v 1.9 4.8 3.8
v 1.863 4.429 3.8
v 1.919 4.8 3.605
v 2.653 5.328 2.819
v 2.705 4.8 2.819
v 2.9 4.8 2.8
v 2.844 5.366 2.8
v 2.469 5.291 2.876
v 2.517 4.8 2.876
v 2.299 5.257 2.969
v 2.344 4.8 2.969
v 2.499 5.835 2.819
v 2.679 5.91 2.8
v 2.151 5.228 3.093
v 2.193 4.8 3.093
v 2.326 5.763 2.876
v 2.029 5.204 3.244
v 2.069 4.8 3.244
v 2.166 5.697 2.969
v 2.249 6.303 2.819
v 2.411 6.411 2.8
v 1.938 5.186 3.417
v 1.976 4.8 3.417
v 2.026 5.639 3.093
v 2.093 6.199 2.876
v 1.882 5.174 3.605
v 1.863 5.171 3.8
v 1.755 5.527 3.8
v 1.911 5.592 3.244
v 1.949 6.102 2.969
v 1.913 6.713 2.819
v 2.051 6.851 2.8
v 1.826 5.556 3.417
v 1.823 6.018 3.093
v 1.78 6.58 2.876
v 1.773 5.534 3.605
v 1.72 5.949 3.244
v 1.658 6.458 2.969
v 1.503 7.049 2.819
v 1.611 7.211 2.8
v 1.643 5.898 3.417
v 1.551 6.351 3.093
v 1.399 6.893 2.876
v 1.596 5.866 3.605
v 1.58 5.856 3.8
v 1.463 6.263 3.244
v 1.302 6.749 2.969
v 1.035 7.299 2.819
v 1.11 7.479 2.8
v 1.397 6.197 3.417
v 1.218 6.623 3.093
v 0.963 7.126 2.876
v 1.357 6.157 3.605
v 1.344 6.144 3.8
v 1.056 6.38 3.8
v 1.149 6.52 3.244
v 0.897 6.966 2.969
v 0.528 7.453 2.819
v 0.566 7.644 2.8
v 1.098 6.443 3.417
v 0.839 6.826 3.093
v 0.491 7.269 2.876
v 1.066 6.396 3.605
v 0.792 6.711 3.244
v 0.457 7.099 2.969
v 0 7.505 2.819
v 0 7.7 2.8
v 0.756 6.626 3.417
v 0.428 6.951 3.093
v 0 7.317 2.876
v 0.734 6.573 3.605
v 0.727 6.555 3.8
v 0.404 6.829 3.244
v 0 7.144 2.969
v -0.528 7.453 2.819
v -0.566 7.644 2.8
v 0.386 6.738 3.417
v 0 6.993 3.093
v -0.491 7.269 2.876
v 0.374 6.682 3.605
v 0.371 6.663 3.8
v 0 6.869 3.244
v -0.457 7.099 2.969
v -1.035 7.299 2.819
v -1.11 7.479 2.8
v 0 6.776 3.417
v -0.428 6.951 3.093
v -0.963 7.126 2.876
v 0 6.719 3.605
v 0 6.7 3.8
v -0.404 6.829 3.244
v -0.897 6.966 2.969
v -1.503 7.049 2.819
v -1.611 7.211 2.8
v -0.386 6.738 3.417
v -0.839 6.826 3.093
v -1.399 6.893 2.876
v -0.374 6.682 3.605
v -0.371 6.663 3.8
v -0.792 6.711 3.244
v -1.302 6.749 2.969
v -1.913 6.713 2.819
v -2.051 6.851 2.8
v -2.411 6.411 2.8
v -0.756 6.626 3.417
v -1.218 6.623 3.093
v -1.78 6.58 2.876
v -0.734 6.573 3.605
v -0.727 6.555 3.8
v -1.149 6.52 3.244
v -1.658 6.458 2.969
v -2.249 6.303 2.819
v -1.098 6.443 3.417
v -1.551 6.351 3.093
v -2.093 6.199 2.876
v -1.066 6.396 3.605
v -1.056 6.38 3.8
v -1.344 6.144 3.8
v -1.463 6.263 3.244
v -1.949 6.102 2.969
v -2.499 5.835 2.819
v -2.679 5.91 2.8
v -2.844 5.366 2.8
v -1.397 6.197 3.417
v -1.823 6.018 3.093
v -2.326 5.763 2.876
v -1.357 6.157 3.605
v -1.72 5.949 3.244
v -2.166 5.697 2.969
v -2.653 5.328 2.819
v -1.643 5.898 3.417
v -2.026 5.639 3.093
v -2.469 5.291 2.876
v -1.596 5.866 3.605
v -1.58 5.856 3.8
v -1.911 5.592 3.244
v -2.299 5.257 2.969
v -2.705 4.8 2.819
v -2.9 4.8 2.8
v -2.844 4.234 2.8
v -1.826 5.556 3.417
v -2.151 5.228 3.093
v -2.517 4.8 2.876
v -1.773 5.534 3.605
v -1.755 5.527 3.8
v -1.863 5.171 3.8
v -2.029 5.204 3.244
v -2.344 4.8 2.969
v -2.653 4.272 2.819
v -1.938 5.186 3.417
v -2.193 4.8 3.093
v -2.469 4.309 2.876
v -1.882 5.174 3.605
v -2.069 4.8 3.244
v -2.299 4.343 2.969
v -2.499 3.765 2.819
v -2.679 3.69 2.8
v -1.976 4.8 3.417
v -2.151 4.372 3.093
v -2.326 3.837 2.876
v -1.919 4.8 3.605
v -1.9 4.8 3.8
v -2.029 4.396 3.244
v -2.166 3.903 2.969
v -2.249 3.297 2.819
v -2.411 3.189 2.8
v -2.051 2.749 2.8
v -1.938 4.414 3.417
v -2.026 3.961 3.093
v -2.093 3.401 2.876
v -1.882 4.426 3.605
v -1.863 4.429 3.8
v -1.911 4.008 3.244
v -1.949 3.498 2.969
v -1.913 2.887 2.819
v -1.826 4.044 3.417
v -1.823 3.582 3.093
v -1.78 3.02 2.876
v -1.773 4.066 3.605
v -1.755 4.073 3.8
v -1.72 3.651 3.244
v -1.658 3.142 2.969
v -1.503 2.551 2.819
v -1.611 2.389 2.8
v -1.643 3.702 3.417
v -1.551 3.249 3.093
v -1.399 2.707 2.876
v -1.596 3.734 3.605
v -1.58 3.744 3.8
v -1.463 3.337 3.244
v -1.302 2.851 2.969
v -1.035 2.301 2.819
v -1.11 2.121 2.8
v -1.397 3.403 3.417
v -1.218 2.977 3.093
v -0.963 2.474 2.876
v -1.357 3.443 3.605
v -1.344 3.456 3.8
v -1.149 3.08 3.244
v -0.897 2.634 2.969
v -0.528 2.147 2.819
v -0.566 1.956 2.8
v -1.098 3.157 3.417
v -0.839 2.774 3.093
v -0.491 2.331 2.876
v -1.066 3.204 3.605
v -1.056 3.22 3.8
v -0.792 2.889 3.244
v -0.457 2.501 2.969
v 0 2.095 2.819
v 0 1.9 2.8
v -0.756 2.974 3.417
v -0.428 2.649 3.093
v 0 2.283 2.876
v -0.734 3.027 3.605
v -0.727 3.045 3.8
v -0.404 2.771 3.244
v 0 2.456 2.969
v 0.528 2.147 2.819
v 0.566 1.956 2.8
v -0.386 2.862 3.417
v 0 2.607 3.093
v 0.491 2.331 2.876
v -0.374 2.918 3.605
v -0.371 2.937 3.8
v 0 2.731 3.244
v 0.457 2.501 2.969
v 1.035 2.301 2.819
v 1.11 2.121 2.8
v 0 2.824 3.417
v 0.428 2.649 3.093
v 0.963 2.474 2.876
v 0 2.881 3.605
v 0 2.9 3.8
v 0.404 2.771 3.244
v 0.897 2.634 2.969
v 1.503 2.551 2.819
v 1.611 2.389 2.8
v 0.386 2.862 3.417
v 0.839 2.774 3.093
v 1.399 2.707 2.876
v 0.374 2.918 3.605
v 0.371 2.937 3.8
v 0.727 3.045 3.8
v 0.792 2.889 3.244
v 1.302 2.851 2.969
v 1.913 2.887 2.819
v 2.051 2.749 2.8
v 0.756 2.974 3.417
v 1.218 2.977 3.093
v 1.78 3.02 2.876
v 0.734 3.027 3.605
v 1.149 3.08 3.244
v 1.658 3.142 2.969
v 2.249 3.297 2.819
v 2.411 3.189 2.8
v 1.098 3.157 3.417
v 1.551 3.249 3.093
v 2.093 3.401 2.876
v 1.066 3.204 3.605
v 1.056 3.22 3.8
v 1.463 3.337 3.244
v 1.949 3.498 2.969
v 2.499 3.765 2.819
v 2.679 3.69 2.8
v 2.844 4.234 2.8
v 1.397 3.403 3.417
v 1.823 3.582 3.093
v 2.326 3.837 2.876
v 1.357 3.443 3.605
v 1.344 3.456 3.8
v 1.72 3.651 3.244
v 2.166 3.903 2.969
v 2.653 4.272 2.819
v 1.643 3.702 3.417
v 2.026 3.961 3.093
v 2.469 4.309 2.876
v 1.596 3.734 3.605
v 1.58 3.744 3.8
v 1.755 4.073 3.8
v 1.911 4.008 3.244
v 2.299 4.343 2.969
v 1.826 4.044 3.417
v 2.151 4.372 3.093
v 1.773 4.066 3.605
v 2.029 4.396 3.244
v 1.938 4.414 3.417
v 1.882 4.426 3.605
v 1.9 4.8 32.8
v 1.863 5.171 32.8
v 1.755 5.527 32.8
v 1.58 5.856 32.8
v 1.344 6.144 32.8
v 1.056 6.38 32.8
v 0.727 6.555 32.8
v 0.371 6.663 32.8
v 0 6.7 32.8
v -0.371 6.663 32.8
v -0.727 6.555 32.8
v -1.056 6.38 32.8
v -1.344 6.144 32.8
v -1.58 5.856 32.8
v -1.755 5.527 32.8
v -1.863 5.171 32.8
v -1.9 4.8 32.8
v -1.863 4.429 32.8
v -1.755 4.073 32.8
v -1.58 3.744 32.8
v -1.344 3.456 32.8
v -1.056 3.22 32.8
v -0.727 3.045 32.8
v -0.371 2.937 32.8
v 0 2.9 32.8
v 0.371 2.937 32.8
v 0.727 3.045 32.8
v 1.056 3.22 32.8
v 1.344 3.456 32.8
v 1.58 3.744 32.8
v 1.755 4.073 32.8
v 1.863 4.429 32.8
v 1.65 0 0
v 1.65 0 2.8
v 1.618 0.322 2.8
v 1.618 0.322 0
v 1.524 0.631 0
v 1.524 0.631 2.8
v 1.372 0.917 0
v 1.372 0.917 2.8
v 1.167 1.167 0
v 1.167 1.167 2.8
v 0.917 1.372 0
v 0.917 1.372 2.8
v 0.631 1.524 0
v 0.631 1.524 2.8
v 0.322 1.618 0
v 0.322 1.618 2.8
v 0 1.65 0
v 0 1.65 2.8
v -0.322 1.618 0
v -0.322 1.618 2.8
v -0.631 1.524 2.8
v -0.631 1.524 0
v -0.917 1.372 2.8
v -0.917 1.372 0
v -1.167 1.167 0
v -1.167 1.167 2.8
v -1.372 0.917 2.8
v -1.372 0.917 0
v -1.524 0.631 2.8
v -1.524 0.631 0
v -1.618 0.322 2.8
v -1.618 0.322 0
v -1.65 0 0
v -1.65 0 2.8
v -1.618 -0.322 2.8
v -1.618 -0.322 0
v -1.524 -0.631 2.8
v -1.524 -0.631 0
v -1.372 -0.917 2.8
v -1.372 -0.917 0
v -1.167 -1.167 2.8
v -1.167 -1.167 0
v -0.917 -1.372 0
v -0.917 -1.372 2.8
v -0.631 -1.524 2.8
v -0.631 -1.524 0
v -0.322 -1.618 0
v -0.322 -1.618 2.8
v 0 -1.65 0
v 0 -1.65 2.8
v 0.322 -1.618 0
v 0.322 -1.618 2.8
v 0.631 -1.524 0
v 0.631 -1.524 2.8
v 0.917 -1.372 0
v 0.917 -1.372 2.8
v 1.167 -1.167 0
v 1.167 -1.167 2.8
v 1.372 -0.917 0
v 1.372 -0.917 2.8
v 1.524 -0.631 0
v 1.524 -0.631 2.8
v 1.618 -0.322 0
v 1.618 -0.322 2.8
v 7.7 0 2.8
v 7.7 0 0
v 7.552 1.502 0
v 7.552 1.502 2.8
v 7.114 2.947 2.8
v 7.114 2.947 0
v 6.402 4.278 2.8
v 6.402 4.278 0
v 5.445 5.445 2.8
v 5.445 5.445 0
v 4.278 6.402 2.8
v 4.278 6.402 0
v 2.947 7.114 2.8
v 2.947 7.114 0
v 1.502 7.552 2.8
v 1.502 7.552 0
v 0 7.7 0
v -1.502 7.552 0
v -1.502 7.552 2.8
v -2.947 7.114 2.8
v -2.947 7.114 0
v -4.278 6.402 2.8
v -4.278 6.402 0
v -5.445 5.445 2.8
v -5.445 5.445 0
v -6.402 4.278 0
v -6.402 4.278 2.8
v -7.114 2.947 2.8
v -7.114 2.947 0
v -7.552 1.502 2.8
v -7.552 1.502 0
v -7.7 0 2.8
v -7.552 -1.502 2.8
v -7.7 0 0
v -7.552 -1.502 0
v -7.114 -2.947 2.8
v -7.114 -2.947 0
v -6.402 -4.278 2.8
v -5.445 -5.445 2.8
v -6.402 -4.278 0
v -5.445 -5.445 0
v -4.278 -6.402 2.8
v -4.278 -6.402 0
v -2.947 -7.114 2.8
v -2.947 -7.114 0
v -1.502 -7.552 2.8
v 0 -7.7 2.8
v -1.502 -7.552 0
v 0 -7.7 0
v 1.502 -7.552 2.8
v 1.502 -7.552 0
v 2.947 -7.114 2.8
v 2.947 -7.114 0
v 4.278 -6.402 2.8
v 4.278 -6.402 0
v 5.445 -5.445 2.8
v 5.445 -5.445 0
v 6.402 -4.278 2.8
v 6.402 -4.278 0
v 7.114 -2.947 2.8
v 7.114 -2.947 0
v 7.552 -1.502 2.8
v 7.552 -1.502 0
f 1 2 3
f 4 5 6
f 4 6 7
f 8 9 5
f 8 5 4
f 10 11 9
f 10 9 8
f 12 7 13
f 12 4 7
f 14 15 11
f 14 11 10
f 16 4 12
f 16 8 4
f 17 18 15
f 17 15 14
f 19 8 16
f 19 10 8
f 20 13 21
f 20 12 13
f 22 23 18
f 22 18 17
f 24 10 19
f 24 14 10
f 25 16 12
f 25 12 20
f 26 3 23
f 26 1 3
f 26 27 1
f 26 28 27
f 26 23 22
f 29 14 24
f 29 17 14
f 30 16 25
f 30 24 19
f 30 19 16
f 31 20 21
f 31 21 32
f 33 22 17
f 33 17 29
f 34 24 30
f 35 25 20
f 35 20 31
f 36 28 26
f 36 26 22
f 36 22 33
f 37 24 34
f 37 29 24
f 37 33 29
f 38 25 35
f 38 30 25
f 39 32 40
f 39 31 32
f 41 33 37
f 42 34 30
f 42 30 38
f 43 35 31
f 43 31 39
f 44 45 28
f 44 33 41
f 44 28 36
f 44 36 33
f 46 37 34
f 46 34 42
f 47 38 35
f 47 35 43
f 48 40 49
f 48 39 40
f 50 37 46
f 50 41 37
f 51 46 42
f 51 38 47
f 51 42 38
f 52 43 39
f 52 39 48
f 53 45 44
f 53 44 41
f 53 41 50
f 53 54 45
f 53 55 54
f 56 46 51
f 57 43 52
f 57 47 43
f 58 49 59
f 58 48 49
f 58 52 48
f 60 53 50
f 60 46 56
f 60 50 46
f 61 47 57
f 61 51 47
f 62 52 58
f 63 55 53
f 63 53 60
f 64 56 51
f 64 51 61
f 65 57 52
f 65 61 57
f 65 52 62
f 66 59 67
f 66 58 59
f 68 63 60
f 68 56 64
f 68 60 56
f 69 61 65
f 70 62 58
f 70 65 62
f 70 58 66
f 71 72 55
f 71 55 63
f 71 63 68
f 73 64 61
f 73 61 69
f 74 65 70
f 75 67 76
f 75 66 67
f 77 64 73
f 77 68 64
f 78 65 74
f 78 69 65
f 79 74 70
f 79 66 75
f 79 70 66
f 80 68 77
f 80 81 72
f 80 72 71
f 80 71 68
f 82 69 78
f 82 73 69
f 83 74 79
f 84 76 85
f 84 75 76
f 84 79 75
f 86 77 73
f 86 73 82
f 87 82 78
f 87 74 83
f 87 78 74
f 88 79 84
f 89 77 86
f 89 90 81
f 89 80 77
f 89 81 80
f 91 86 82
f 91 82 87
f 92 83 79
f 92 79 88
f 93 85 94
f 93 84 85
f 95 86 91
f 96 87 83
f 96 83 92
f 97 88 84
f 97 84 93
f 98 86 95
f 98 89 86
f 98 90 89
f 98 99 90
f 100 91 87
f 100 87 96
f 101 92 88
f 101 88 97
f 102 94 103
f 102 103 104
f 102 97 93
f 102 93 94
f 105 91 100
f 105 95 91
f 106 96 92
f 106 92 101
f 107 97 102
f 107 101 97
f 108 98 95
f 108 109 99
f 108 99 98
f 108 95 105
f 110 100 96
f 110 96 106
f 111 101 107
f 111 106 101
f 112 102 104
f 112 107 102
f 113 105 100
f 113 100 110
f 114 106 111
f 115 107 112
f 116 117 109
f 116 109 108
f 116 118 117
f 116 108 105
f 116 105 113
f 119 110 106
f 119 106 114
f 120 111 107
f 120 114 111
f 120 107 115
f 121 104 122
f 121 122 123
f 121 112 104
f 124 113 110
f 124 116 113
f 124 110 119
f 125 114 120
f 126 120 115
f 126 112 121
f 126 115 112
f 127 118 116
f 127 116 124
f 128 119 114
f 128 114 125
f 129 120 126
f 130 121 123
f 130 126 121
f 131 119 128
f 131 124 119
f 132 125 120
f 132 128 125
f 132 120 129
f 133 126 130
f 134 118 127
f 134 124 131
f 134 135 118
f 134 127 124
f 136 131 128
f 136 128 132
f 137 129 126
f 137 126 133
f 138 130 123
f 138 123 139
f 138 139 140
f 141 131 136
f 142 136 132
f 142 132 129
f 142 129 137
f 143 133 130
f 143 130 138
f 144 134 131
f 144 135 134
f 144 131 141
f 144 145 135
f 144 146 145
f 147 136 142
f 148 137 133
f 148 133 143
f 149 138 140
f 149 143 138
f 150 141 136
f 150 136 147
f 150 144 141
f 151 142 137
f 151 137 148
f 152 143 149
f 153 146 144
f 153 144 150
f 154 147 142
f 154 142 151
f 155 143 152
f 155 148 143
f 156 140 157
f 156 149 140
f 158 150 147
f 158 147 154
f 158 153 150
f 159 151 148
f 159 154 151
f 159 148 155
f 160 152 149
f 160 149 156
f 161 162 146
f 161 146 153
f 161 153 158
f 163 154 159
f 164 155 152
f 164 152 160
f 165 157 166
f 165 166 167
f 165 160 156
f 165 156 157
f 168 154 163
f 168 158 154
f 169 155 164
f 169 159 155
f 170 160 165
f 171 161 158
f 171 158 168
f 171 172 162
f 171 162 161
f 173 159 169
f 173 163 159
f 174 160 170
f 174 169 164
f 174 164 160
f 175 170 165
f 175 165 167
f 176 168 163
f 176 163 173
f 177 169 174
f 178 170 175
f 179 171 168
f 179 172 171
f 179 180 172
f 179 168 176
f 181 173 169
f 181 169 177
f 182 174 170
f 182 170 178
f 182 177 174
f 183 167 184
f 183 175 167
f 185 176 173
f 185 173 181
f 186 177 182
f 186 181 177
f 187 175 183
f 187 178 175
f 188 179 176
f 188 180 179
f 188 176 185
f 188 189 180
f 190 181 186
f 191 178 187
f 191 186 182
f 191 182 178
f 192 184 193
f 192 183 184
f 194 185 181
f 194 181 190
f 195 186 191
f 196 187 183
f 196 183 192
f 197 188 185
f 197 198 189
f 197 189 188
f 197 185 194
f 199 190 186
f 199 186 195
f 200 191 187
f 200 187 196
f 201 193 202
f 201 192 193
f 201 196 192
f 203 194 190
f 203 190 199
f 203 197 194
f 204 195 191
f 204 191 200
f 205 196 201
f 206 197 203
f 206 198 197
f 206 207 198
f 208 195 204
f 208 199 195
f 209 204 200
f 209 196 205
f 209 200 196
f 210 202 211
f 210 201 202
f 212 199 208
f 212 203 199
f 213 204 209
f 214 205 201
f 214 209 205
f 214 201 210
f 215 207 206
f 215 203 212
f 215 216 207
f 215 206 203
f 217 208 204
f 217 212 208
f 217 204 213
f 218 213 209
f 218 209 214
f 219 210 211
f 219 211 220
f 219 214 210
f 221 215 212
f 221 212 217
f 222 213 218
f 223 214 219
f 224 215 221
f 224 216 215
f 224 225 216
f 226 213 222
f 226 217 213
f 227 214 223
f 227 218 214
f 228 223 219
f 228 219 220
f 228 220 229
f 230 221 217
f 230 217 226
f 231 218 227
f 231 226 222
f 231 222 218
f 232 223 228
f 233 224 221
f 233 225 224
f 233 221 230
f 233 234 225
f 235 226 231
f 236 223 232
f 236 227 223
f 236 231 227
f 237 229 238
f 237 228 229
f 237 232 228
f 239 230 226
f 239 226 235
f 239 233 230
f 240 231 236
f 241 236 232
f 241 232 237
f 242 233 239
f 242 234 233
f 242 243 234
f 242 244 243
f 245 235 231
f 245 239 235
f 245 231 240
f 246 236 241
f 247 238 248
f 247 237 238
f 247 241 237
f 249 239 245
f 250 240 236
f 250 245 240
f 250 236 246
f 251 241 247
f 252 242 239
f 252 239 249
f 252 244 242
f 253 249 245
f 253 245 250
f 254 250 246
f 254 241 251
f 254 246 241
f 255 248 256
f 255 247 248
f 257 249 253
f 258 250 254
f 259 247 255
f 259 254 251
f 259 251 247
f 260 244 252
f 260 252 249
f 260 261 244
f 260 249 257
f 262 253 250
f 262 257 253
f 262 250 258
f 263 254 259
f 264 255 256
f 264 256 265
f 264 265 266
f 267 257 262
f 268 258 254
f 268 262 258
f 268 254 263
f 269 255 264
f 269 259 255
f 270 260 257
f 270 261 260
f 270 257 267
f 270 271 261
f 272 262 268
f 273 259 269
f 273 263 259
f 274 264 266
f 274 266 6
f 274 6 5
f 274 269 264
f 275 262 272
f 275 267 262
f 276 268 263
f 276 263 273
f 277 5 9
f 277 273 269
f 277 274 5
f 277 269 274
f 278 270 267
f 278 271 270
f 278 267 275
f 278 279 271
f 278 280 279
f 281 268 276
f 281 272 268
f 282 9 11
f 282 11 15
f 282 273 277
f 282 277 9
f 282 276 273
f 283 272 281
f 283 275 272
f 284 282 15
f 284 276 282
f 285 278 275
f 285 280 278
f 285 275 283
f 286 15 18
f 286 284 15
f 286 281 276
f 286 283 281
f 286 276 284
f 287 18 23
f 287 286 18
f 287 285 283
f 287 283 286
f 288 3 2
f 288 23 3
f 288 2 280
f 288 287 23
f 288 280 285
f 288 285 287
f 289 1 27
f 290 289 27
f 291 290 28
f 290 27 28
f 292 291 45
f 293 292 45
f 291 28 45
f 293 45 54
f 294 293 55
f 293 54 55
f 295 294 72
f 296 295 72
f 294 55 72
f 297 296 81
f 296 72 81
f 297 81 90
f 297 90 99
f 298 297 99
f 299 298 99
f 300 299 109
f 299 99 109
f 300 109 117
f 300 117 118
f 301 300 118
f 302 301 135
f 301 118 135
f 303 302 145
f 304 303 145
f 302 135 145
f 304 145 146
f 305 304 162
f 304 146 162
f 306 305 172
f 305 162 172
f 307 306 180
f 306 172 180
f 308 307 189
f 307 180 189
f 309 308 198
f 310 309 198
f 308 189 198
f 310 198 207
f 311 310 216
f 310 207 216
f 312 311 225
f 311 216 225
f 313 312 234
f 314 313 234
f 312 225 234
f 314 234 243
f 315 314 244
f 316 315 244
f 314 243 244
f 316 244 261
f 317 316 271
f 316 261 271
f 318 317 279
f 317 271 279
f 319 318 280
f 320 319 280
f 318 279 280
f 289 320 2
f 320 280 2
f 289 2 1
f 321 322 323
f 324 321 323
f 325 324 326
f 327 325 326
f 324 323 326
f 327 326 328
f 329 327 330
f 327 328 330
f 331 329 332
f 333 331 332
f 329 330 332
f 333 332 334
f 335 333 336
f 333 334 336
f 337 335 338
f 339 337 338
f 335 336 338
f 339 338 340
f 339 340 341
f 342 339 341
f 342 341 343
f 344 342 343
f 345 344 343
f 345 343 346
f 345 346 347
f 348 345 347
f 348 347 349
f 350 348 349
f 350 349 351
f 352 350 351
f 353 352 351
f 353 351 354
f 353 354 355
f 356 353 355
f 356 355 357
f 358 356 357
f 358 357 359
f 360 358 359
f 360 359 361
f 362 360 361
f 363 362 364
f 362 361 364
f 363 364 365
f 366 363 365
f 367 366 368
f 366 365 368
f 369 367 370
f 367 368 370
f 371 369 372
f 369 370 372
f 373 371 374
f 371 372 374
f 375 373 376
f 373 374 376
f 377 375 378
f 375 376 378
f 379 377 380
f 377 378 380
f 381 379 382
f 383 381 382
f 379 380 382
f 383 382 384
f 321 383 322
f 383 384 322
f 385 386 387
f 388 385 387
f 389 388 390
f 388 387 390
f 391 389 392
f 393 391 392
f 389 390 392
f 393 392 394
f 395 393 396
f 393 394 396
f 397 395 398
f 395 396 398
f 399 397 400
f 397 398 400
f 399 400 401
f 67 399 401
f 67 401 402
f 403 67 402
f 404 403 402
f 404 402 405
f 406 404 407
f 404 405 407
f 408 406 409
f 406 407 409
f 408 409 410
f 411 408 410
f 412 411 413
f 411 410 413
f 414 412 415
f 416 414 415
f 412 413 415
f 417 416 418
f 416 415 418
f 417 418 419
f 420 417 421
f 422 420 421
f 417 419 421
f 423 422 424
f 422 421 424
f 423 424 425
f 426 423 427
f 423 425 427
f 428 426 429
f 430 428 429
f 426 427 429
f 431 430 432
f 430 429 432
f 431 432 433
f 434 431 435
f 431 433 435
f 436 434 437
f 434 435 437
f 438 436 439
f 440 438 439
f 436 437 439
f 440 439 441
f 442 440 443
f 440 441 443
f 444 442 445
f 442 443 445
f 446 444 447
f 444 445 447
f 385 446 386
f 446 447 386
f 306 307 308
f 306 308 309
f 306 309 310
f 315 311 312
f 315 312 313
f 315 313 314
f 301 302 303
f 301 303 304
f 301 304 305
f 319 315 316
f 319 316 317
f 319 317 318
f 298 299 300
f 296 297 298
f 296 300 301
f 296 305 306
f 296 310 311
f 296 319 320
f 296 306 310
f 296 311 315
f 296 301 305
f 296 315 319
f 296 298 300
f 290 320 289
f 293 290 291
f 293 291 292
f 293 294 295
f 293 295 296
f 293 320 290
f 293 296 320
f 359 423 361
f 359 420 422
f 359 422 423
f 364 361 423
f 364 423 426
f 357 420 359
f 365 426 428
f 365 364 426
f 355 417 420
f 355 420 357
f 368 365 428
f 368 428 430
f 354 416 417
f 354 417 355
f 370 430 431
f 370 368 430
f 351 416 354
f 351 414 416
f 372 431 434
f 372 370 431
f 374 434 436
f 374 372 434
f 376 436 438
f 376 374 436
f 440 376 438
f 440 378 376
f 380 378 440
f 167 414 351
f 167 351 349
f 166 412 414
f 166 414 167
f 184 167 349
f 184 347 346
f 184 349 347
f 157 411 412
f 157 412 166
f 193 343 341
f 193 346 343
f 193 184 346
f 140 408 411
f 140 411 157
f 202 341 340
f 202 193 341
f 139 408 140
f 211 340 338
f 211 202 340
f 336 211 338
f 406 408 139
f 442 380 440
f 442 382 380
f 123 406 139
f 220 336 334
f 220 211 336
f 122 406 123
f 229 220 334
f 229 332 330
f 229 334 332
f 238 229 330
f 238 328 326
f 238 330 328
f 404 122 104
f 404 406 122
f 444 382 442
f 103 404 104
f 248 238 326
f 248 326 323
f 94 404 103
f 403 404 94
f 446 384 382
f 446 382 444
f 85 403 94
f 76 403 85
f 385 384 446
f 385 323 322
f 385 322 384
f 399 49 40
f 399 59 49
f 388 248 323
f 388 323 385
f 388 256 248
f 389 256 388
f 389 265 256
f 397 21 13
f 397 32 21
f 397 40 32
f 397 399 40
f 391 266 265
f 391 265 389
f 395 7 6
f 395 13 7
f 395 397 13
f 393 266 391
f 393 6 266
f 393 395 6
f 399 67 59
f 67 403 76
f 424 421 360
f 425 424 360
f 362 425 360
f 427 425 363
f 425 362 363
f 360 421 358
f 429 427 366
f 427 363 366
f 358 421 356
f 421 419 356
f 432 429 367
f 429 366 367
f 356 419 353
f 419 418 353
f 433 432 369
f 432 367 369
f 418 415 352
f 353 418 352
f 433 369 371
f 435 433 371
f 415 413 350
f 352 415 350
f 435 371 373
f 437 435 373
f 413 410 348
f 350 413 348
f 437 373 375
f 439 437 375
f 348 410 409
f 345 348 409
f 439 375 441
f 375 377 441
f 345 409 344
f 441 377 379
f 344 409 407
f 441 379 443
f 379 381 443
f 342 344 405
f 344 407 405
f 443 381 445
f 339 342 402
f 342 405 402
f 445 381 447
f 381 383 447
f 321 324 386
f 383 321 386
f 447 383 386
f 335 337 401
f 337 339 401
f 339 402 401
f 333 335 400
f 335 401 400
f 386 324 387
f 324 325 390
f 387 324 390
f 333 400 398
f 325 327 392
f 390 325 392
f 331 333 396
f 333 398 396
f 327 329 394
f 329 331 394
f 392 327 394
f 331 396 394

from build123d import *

# Parameters (mm, degrees)
ESQUISSE1_R             = 7.7
BOSS_EXTRU_1_DEPTH      = 2.8
ESQUISSE2_R             = 1.9
BOSS_EXTRU_2_DEPTH      = 30
ESQUISSE3_R             = 1.65
ENL_V_MAT_EXTRU_1_DEPTH = 32.91520014
CONG_2_R                = 1


with BuildPart() as part:
    # Esquisse1 → Boss.-Extru.1 (new body)
    with BuildSketch(Plane.XY):
        Circle(ESQUISSE1_R)
    extrude(amount=BOSS_EXTRU_1_DEPTH)

    # Esquisse2 → Boss.-Extru.2 (add)
    with BuildSketch(Plane.XY.offset(2.8)):
        with Locations((0, 4.8)):
            Circle(ESQUISSE2_R)
    extrude(amount=BOSS_EXTRU_2_DEPTH)

    # Esquisse3 → Enlèv. mat.-Extru.1 (cut, through all)
    with BuildSketch(Plane.XY.offset(2.8)):
        Circle(ESQUISSE3_R)
    extrude(amount=-ENL_V_MAT_EXTRU_1_DEPTH, mode=Mode.SUBTRACT)

    # Congé2
    cong_2_edges = [part.edges().sort_by_distance(p)[0] for p in [
        (-1.9, 4.8, 2.8),
    ]]
    fillet(cong_2_edges, radius=CONG_2_R - 0.0001)  # a hair under: the kernel refuses the full size


solid = part.part
